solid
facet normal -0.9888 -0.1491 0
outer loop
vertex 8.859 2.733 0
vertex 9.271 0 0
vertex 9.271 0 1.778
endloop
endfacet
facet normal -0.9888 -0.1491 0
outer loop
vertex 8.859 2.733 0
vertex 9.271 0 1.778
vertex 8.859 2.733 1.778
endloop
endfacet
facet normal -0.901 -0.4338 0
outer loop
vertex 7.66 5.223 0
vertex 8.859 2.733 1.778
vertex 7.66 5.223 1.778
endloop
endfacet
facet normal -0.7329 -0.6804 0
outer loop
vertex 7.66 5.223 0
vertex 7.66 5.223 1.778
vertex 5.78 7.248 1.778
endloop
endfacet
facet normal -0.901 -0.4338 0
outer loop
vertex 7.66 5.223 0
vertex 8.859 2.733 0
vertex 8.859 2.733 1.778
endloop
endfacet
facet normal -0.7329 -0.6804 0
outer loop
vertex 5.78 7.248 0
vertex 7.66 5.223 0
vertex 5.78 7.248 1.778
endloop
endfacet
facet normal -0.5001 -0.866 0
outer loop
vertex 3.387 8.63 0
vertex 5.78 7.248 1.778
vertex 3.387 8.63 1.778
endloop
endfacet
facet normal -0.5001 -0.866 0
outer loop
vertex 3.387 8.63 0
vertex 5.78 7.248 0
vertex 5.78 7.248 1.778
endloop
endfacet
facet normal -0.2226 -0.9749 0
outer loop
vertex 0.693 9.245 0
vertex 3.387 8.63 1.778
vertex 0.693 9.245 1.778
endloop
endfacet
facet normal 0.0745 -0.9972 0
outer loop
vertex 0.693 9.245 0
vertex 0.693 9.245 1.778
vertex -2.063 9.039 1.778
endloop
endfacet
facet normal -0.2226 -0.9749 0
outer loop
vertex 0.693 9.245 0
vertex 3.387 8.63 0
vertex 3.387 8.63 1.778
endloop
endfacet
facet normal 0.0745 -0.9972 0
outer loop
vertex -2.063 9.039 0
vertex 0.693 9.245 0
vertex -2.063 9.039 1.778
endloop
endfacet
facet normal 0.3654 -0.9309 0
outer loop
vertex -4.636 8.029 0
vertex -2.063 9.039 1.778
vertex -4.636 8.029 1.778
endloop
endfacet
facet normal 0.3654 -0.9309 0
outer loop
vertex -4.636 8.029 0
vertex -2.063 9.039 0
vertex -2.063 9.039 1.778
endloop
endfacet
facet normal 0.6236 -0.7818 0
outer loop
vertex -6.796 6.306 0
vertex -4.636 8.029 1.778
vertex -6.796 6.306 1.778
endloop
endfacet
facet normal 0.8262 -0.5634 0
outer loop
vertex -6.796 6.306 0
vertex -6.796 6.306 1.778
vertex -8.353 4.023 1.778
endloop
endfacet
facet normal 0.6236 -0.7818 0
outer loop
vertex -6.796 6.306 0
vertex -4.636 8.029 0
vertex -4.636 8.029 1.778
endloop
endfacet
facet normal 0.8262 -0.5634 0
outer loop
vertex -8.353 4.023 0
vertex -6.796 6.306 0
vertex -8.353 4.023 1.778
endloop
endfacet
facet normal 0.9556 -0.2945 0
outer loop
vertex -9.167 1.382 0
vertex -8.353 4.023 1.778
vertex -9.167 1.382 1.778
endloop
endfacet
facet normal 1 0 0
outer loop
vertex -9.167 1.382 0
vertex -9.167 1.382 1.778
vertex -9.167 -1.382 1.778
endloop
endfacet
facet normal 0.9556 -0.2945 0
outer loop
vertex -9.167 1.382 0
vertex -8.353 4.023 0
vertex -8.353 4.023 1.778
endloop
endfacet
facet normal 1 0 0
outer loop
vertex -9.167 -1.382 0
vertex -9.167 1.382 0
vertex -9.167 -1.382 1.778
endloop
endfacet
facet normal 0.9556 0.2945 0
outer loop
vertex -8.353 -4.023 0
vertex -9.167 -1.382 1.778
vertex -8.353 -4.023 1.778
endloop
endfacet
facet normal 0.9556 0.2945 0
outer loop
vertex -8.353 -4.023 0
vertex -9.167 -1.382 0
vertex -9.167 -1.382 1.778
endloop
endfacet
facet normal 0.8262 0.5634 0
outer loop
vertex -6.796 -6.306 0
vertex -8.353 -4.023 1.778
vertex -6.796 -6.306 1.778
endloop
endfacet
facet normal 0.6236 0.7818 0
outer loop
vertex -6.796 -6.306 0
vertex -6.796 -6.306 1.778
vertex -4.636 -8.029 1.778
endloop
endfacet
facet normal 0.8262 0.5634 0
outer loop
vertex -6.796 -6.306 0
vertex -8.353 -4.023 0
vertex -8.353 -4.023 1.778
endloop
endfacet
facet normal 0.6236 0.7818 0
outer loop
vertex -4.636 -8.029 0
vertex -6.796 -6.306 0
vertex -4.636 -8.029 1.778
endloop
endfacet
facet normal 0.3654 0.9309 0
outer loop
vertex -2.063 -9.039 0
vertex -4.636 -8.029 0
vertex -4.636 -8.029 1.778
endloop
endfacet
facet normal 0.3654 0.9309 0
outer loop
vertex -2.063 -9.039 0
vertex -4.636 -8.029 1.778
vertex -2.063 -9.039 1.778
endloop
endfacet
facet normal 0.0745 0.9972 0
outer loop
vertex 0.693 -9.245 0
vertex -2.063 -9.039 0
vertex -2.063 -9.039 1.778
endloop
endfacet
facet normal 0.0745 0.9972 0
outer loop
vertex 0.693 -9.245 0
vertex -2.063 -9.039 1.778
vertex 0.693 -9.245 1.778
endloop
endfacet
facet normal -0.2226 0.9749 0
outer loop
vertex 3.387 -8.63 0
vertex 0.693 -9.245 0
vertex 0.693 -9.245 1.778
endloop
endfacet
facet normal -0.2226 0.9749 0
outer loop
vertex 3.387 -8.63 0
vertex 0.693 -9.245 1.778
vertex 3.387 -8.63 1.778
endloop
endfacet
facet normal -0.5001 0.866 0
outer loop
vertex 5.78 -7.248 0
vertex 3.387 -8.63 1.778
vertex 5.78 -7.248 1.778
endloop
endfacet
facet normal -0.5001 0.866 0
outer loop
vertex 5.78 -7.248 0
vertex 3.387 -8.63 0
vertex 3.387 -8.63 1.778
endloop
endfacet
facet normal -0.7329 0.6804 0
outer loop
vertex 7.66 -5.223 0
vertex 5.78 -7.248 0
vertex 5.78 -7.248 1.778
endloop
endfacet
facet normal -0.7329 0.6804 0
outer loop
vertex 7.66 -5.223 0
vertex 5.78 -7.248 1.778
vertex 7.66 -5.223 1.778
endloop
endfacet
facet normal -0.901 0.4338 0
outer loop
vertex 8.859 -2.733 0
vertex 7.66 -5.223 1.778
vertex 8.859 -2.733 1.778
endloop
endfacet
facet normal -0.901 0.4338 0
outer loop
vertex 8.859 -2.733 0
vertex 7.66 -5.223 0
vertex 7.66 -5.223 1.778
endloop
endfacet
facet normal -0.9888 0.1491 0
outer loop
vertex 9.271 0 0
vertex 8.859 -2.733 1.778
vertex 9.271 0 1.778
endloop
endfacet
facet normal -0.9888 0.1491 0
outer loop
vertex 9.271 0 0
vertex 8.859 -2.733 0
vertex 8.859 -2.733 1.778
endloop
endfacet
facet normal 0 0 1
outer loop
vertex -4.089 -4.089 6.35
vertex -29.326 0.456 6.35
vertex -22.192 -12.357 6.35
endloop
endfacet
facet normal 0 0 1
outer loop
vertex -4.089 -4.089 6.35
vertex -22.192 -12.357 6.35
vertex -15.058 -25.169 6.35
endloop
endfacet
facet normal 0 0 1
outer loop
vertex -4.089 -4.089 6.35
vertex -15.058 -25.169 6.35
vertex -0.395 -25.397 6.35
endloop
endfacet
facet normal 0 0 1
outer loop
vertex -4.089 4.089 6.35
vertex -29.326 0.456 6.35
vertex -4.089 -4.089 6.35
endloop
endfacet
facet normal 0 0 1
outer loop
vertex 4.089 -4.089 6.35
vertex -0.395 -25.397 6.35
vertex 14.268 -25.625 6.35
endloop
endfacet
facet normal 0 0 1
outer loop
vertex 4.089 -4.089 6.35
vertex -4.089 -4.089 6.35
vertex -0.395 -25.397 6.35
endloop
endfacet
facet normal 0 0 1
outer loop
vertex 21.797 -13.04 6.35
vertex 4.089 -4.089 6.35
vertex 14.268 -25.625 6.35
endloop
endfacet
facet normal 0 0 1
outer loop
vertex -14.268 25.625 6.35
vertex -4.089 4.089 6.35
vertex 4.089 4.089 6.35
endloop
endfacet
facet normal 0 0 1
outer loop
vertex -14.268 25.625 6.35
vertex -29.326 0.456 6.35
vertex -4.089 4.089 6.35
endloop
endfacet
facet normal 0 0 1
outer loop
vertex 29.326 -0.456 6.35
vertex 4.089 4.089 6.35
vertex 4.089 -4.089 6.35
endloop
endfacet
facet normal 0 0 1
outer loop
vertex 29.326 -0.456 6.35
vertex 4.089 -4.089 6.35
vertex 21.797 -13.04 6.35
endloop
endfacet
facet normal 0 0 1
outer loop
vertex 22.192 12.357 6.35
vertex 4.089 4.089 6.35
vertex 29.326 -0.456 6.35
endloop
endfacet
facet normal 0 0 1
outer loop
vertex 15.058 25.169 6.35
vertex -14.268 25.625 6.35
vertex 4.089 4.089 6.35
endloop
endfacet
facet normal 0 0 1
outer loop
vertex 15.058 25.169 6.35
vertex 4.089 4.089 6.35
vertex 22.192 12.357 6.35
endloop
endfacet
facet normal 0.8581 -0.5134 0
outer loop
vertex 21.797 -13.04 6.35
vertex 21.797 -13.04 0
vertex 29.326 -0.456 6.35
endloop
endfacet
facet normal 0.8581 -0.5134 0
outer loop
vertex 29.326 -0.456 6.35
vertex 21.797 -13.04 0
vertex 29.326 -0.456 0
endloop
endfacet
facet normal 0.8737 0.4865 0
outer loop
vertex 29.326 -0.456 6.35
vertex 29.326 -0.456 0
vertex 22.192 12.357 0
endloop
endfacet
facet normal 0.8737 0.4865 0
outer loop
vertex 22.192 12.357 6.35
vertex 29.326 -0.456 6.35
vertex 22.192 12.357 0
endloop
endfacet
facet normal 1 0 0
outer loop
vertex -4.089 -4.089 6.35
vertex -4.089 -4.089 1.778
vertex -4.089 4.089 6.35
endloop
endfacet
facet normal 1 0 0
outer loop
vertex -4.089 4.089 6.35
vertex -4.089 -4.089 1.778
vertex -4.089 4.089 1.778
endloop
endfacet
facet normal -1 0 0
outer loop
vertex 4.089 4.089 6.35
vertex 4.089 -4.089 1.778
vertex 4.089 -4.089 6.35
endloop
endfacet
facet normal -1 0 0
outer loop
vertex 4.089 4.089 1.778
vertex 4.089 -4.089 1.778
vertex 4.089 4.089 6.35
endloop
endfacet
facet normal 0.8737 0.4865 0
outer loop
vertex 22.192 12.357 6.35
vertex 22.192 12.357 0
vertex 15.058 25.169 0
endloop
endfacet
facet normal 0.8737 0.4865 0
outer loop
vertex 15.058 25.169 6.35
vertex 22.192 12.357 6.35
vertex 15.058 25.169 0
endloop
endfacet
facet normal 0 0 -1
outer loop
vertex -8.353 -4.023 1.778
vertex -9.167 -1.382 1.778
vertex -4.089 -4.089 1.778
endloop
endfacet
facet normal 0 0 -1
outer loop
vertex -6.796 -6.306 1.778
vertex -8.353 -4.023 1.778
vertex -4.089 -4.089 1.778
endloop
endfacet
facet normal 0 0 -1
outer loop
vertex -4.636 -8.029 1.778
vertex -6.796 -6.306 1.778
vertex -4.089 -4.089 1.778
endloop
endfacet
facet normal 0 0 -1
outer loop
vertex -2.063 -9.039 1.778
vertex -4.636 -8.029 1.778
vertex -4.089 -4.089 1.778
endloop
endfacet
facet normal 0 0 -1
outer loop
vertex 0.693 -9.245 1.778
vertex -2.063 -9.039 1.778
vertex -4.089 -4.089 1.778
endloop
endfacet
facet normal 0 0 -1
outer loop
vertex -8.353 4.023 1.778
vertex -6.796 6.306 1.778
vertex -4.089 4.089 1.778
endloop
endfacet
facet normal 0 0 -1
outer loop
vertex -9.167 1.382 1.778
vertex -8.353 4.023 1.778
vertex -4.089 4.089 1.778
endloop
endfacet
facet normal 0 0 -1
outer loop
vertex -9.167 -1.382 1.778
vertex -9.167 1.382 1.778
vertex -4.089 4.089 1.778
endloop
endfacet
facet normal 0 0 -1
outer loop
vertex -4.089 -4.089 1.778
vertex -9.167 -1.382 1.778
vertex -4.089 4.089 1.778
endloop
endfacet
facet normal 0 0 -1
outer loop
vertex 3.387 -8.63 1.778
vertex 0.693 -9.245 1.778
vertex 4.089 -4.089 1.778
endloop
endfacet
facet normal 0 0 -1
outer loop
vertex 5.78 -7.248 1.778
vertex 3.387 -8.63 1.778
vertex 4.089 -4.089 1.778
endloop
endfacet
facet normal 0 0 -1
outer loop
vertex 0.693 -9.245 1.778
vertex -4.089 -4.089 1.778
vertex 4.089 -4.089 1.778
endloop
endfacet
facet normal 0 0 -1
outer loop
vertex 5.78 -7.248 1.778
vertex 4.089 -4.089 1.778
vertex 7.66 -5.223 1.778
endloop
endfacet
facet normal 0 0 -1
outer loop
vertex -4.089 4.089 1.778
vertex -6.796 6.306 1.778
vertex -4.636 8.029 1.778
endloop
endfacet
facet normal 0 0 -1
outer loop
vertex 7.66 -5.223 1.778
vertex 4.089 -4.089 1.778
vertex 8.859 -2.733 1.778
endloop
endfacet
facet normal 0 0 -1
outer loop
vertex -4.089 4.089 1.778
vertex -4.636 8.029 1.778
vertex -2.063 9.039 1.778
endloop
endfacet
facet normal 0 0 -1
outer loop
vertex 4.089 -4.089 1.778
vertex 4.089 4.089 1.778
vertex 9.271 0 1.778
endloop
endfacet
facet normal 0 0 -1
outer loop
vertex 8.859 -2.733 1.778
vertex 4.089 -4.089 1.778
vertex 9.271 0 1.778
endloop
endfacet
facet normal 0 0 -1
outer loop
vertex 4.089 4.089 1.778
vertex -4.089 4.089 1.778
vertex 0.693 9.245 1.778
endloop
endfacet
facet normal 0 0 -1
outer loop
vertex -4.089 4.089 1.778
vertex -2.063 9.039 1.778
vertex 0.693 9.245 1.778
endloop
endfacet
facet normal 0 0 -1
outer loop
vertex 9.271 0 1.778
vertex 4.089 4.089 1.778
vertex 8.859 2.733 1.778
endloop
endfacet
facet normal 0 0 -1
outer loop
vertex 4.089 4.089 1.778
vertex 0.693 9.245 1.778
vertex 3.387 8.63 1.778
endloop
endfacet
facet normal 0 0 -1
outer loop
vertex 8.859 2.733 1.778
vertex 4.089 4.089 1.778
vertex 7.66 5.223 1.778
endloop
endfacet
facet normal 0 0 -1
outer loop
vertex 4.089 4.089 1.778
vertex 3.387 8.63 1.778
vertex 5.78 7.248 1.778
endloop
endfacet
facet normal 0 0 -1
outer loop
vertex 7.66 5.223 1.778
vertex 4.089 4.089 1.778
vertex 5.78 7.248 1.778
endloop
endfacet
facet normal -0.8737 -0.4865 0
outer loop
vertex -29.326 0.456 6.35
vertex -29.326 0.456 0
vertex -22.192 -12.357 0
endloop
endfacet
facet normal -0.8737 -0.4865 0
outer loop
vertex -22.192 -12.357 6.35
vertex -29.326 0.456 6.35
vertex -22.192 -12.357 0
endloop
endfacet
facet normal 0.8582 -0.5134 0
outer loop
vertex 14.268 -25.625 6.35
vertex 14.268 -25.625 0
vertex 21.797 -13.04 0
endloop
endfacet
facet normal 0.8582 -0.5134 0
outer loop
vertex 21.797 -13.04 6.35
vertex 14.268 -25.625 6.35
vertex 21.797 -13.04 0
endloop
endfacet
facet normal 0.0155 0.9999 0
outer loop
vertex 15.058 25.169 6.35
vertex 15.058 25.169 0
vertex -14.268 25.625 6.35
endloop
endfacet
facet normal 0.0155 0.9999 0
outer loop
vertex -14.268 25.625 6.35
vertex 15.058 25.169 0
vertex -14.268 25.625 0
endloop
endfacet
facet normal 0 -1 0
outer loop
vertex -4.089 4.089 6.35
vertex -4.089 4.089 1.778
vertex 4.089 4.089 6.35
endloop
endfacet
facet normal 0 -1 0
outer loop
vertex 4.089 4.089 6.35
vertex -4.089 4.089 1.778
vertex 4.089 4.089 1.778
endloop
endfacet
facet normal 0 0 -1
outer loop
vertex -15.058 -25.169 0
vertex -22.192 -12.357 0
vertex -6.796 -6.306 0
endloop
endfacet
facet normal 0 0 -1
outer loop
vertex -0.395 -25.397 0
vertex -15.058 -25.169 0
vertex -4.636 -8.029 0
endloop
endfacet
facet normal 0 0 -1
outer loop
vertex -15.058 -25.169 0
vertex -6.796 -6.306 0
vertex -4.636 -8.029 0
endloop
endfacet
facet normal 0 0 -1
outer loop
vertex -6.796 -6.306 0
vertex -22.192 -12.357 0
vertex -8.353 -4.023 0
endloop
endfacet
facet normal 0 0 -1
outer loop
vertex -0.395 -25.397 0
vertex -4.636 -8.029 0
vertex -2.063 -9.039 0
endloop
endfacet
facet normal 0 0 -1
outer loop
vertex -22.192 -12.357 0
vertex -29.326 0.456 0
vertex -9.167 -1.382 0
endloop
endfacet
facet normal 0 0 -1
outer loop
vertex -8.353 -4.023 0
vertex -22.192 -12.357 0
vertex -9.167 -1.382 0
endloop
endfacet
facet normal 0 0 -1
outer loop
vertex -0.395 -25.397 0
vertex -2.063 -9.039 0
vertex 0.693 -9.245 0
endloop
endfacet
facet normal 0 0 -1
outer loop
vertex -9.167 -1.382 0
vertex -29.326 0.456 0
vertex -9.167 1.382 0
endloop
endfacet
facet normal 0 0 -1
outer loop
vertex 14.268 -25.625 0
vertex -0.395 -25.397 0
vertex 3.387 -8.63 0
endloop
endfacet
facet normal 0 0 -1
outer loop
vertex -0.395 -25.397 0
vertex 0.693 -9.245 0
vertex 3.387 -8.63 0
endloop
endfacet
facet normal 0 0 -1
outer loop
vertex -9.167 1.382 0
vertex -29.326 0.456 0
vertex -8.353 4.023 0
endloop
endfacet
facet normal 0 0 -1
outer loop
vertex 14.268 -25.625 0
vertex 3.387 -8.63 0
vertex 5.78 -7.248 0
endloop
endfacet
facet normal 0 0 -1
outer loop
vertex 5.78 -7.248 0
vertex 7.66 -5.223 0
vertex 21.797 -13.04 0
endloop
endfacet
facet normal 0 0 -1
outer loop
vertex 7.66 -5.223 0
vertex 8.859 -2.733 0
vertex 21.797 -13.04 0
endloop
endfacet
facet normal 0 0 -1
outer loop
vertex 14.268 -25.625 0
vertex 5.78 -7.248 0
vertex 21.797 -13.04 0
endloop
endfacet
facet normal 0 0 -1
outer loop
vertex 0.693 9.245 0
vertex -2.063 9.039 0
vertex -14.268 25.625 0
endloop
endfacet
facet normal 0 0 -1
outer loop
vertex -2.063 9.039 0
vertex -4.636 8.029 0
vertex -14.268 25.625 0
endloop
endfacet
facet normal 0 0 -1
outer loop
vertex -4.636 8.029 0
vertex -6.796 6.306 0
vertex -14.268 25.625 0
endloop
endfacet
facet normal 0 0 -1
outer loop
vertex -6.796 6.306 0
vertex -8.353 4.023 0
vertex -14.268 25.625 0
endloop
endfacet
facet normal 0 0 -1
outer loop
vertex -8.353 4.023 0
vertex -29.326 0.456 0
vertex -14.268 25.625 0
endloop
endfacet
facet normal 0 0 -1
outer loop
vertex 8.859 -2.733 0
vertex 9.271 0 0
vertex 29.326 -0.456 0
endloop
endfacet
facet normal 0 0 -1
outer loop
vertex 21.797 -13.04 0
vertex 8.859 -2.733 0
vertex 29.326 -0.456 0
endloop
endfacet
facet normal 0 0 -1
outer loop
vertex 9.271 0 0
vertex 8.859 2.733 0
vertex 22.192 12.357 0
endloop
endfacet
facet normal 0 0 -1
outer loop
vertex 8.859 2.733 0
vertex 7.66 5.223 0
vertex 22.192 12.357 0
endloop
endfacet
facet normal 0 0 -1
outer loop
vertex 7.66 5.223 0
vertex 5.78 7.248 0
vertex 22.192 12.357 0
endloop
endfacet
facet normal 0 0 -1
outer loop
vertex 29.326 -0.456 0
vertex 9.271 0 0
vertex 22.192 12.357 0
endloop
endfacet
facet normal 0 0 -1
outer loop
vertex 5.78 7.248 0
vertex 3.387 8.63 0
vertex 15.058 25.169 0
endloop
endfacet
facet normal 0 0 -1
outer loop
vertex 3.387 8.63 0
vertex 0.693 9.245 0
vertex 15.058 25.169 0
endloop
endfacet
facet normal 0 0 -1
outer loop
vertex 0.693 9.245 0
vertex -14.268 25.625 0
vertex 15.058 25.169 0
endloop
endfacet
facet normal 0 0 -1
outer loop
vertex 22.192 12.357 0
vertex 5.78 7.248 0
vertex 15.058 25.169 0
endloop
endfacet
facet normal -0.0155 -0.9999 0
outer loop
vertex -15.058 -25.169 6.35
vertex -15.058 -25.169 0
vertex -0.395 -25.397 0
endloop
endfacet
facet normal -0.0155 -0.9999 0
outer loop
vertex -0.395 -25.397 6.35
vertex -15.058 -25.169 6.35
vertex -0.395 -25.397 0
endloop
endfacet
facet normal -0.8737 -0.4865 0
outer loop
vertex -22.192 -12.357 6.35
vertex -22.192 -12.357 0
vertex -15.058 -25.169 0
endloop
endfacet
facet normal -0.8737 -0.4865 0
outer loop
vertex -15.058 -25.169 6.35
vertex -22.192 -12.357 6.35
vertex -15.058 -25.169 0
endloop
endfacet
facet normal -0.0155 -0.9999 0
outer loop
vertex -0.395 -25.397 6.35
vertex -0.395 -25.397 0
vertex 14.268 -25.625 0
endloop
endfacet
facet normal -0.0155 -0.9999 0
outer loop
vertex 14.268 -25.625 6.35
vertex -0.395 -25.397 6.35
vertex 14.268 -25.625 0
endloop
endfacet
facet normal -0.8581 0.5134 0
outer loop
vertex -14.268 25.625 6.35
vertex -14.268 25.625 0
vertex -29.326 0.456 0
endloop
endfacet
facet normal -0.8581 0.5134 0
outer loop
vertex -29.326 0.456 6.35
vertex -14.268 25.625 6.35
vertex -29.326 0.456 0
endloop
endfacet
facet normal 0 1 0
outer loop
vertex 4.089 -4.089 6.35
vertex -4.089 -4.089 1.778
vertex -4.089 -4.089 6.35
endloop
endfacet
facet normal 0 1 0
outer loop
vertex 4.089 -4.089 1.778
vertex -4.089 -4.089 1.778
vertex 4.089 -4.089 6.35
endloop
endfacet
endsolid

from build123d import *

# Parameters (mm, degrees)
F0_R     = 9.271
F0_W     = 8.1788
F0_H     = 8.1788
F1_DEPTH = 6.35
F2_DEPTH = 1.778


with BuildPart() as f1:
    # F0 (on Top) → F1 (new body)
    with BuildSketch(Plane.XY):
        with BuildLine():
            ThreePointArc((21.7969618714, -13.0404161427), (24.4826758294, -6.7645091642), (25.4, 0))
            ThreePointArc((25.4, 0), (24.5848737642, 6.3831012839), (22.1918124409, 12.3565149045))
            ThreePointArc((22.1918124409, 12.3565149045), (13.0404159786, 21.7969619696), (0.3948506462, 25.3969307785))
            ThreePointArc((0.3948506462, 25.3969307785), (-12.3565148847, 22.191812452), (-21.7969621275, 13.0404157147))
            ThreePointArc((-21.7969621275, 13.0404157147), (-25.3969307892, 0.3948499567), (-22.1918120914, -12.3565155323))
            ThreePointArc((-22.1918120914, -12.3565155323), (-13.0404155443, -21.7969622294), (-0.3948503527, -25.396930783))
            ThreePointArc((-0.3948503527, -25.396930783), (12.356514795, -22.1918125019), (21.7969618714, -13.0404161427))
        make_face()
        Circle(F0_R, mode=Mode.SUBTRACT)
        with BuildLine():
            ThreePointArc((-21.7969621275, 13.0404157147), (-12.3565148847, 22.191812452), (0.3948506462, 25.3969307785))
            Line((0.3948506462, 25.3969307785), (-14.2680745061, 25.6248977212))
            Line((-14.2680745061, 25.6248977212), (-21.7969621275, 13.0404157147))
        make_face()
        with BuildLine():
            ThreePointArc((0.3948506462, 25.3969307785), (13.0404159786, 21.7969619696), (22.1918124409, 12.3565149045))
            Line((22.1918124409, 12.3565149045), (15.0577751429, 25.168963846))
            Line((15.0577751429, 25.168963846), (0.3948506462, 25.3969307785))
        make_face()
        with BuildLine():
            ThreePointArc((22.1918124409, 12.3565149045), (24.5848737642, 6.3831012839), (25.4, 0))
            ThreePointArc((25.4, 0), (24.4826758294, -6.7645091642), (21.7969618714, -13.0404161427))
            Line((21.7969618714, -13.0404161427), (29.325849649, -0.4559338752))
            Line((29.325849649, -0.4559338752), (22.1918124409, 12.3565149045))
        make_face()
        with BuildLine():
            Line((14.2680745061, -25.6248977212), (21.7969618714, -13.0404161427))
            ThreePointArc((21.7969618714, -13.0404161427), (12.356514795, -22.1918125019), (-0.3948503527, -25.396930783))
            Line((-0.3948503527, -25.396930783), (14.2680745061, -25.6248977212))
        make_face()
        with BuildLine():
            Line((-15.0577751429, -25.168963846), (-0.3948503527, -25.396930783))
            ThreePointArc((-0.3948503527, -25.396930783), (-13.0404155443, -21.7969622294), (-22.1918120914, -12.3565155323))
            Line((-22.1918120914, -12.3565155323), (-15.0577751429, -25.168963846))
        make_face()
        with BuildLine():
            ThreePointArc((-22.1918120914, -12.3565155323), (-25.3969307892, 0.3948499567), (-21.7969621275, 13.0404157147))
            Line((-21.7969621275, 13.0404157147), (-29.325849649, 0.4559338752))
            Line((-29.325849649, 0.4559338752), (-22.1918120914, -12.3565155323))
        make_face()
        Circle(F0_R)
        Rectangle(F0_W, F0_H, mode=Mode.SUBTRACT)
    extrude(amount=F1_DEPTH)

    # F0 (on Top) → F2 (cut)
    with BuildSketch(Plane.XY):
        Circle(F0_R)
        Rectangle(F0_W, F0_H, mode=Mode.SUBTRACT)
    extrude(amount=F2_DEPTH, mode=Mode.SUBTRACT)


solid = f1.part
